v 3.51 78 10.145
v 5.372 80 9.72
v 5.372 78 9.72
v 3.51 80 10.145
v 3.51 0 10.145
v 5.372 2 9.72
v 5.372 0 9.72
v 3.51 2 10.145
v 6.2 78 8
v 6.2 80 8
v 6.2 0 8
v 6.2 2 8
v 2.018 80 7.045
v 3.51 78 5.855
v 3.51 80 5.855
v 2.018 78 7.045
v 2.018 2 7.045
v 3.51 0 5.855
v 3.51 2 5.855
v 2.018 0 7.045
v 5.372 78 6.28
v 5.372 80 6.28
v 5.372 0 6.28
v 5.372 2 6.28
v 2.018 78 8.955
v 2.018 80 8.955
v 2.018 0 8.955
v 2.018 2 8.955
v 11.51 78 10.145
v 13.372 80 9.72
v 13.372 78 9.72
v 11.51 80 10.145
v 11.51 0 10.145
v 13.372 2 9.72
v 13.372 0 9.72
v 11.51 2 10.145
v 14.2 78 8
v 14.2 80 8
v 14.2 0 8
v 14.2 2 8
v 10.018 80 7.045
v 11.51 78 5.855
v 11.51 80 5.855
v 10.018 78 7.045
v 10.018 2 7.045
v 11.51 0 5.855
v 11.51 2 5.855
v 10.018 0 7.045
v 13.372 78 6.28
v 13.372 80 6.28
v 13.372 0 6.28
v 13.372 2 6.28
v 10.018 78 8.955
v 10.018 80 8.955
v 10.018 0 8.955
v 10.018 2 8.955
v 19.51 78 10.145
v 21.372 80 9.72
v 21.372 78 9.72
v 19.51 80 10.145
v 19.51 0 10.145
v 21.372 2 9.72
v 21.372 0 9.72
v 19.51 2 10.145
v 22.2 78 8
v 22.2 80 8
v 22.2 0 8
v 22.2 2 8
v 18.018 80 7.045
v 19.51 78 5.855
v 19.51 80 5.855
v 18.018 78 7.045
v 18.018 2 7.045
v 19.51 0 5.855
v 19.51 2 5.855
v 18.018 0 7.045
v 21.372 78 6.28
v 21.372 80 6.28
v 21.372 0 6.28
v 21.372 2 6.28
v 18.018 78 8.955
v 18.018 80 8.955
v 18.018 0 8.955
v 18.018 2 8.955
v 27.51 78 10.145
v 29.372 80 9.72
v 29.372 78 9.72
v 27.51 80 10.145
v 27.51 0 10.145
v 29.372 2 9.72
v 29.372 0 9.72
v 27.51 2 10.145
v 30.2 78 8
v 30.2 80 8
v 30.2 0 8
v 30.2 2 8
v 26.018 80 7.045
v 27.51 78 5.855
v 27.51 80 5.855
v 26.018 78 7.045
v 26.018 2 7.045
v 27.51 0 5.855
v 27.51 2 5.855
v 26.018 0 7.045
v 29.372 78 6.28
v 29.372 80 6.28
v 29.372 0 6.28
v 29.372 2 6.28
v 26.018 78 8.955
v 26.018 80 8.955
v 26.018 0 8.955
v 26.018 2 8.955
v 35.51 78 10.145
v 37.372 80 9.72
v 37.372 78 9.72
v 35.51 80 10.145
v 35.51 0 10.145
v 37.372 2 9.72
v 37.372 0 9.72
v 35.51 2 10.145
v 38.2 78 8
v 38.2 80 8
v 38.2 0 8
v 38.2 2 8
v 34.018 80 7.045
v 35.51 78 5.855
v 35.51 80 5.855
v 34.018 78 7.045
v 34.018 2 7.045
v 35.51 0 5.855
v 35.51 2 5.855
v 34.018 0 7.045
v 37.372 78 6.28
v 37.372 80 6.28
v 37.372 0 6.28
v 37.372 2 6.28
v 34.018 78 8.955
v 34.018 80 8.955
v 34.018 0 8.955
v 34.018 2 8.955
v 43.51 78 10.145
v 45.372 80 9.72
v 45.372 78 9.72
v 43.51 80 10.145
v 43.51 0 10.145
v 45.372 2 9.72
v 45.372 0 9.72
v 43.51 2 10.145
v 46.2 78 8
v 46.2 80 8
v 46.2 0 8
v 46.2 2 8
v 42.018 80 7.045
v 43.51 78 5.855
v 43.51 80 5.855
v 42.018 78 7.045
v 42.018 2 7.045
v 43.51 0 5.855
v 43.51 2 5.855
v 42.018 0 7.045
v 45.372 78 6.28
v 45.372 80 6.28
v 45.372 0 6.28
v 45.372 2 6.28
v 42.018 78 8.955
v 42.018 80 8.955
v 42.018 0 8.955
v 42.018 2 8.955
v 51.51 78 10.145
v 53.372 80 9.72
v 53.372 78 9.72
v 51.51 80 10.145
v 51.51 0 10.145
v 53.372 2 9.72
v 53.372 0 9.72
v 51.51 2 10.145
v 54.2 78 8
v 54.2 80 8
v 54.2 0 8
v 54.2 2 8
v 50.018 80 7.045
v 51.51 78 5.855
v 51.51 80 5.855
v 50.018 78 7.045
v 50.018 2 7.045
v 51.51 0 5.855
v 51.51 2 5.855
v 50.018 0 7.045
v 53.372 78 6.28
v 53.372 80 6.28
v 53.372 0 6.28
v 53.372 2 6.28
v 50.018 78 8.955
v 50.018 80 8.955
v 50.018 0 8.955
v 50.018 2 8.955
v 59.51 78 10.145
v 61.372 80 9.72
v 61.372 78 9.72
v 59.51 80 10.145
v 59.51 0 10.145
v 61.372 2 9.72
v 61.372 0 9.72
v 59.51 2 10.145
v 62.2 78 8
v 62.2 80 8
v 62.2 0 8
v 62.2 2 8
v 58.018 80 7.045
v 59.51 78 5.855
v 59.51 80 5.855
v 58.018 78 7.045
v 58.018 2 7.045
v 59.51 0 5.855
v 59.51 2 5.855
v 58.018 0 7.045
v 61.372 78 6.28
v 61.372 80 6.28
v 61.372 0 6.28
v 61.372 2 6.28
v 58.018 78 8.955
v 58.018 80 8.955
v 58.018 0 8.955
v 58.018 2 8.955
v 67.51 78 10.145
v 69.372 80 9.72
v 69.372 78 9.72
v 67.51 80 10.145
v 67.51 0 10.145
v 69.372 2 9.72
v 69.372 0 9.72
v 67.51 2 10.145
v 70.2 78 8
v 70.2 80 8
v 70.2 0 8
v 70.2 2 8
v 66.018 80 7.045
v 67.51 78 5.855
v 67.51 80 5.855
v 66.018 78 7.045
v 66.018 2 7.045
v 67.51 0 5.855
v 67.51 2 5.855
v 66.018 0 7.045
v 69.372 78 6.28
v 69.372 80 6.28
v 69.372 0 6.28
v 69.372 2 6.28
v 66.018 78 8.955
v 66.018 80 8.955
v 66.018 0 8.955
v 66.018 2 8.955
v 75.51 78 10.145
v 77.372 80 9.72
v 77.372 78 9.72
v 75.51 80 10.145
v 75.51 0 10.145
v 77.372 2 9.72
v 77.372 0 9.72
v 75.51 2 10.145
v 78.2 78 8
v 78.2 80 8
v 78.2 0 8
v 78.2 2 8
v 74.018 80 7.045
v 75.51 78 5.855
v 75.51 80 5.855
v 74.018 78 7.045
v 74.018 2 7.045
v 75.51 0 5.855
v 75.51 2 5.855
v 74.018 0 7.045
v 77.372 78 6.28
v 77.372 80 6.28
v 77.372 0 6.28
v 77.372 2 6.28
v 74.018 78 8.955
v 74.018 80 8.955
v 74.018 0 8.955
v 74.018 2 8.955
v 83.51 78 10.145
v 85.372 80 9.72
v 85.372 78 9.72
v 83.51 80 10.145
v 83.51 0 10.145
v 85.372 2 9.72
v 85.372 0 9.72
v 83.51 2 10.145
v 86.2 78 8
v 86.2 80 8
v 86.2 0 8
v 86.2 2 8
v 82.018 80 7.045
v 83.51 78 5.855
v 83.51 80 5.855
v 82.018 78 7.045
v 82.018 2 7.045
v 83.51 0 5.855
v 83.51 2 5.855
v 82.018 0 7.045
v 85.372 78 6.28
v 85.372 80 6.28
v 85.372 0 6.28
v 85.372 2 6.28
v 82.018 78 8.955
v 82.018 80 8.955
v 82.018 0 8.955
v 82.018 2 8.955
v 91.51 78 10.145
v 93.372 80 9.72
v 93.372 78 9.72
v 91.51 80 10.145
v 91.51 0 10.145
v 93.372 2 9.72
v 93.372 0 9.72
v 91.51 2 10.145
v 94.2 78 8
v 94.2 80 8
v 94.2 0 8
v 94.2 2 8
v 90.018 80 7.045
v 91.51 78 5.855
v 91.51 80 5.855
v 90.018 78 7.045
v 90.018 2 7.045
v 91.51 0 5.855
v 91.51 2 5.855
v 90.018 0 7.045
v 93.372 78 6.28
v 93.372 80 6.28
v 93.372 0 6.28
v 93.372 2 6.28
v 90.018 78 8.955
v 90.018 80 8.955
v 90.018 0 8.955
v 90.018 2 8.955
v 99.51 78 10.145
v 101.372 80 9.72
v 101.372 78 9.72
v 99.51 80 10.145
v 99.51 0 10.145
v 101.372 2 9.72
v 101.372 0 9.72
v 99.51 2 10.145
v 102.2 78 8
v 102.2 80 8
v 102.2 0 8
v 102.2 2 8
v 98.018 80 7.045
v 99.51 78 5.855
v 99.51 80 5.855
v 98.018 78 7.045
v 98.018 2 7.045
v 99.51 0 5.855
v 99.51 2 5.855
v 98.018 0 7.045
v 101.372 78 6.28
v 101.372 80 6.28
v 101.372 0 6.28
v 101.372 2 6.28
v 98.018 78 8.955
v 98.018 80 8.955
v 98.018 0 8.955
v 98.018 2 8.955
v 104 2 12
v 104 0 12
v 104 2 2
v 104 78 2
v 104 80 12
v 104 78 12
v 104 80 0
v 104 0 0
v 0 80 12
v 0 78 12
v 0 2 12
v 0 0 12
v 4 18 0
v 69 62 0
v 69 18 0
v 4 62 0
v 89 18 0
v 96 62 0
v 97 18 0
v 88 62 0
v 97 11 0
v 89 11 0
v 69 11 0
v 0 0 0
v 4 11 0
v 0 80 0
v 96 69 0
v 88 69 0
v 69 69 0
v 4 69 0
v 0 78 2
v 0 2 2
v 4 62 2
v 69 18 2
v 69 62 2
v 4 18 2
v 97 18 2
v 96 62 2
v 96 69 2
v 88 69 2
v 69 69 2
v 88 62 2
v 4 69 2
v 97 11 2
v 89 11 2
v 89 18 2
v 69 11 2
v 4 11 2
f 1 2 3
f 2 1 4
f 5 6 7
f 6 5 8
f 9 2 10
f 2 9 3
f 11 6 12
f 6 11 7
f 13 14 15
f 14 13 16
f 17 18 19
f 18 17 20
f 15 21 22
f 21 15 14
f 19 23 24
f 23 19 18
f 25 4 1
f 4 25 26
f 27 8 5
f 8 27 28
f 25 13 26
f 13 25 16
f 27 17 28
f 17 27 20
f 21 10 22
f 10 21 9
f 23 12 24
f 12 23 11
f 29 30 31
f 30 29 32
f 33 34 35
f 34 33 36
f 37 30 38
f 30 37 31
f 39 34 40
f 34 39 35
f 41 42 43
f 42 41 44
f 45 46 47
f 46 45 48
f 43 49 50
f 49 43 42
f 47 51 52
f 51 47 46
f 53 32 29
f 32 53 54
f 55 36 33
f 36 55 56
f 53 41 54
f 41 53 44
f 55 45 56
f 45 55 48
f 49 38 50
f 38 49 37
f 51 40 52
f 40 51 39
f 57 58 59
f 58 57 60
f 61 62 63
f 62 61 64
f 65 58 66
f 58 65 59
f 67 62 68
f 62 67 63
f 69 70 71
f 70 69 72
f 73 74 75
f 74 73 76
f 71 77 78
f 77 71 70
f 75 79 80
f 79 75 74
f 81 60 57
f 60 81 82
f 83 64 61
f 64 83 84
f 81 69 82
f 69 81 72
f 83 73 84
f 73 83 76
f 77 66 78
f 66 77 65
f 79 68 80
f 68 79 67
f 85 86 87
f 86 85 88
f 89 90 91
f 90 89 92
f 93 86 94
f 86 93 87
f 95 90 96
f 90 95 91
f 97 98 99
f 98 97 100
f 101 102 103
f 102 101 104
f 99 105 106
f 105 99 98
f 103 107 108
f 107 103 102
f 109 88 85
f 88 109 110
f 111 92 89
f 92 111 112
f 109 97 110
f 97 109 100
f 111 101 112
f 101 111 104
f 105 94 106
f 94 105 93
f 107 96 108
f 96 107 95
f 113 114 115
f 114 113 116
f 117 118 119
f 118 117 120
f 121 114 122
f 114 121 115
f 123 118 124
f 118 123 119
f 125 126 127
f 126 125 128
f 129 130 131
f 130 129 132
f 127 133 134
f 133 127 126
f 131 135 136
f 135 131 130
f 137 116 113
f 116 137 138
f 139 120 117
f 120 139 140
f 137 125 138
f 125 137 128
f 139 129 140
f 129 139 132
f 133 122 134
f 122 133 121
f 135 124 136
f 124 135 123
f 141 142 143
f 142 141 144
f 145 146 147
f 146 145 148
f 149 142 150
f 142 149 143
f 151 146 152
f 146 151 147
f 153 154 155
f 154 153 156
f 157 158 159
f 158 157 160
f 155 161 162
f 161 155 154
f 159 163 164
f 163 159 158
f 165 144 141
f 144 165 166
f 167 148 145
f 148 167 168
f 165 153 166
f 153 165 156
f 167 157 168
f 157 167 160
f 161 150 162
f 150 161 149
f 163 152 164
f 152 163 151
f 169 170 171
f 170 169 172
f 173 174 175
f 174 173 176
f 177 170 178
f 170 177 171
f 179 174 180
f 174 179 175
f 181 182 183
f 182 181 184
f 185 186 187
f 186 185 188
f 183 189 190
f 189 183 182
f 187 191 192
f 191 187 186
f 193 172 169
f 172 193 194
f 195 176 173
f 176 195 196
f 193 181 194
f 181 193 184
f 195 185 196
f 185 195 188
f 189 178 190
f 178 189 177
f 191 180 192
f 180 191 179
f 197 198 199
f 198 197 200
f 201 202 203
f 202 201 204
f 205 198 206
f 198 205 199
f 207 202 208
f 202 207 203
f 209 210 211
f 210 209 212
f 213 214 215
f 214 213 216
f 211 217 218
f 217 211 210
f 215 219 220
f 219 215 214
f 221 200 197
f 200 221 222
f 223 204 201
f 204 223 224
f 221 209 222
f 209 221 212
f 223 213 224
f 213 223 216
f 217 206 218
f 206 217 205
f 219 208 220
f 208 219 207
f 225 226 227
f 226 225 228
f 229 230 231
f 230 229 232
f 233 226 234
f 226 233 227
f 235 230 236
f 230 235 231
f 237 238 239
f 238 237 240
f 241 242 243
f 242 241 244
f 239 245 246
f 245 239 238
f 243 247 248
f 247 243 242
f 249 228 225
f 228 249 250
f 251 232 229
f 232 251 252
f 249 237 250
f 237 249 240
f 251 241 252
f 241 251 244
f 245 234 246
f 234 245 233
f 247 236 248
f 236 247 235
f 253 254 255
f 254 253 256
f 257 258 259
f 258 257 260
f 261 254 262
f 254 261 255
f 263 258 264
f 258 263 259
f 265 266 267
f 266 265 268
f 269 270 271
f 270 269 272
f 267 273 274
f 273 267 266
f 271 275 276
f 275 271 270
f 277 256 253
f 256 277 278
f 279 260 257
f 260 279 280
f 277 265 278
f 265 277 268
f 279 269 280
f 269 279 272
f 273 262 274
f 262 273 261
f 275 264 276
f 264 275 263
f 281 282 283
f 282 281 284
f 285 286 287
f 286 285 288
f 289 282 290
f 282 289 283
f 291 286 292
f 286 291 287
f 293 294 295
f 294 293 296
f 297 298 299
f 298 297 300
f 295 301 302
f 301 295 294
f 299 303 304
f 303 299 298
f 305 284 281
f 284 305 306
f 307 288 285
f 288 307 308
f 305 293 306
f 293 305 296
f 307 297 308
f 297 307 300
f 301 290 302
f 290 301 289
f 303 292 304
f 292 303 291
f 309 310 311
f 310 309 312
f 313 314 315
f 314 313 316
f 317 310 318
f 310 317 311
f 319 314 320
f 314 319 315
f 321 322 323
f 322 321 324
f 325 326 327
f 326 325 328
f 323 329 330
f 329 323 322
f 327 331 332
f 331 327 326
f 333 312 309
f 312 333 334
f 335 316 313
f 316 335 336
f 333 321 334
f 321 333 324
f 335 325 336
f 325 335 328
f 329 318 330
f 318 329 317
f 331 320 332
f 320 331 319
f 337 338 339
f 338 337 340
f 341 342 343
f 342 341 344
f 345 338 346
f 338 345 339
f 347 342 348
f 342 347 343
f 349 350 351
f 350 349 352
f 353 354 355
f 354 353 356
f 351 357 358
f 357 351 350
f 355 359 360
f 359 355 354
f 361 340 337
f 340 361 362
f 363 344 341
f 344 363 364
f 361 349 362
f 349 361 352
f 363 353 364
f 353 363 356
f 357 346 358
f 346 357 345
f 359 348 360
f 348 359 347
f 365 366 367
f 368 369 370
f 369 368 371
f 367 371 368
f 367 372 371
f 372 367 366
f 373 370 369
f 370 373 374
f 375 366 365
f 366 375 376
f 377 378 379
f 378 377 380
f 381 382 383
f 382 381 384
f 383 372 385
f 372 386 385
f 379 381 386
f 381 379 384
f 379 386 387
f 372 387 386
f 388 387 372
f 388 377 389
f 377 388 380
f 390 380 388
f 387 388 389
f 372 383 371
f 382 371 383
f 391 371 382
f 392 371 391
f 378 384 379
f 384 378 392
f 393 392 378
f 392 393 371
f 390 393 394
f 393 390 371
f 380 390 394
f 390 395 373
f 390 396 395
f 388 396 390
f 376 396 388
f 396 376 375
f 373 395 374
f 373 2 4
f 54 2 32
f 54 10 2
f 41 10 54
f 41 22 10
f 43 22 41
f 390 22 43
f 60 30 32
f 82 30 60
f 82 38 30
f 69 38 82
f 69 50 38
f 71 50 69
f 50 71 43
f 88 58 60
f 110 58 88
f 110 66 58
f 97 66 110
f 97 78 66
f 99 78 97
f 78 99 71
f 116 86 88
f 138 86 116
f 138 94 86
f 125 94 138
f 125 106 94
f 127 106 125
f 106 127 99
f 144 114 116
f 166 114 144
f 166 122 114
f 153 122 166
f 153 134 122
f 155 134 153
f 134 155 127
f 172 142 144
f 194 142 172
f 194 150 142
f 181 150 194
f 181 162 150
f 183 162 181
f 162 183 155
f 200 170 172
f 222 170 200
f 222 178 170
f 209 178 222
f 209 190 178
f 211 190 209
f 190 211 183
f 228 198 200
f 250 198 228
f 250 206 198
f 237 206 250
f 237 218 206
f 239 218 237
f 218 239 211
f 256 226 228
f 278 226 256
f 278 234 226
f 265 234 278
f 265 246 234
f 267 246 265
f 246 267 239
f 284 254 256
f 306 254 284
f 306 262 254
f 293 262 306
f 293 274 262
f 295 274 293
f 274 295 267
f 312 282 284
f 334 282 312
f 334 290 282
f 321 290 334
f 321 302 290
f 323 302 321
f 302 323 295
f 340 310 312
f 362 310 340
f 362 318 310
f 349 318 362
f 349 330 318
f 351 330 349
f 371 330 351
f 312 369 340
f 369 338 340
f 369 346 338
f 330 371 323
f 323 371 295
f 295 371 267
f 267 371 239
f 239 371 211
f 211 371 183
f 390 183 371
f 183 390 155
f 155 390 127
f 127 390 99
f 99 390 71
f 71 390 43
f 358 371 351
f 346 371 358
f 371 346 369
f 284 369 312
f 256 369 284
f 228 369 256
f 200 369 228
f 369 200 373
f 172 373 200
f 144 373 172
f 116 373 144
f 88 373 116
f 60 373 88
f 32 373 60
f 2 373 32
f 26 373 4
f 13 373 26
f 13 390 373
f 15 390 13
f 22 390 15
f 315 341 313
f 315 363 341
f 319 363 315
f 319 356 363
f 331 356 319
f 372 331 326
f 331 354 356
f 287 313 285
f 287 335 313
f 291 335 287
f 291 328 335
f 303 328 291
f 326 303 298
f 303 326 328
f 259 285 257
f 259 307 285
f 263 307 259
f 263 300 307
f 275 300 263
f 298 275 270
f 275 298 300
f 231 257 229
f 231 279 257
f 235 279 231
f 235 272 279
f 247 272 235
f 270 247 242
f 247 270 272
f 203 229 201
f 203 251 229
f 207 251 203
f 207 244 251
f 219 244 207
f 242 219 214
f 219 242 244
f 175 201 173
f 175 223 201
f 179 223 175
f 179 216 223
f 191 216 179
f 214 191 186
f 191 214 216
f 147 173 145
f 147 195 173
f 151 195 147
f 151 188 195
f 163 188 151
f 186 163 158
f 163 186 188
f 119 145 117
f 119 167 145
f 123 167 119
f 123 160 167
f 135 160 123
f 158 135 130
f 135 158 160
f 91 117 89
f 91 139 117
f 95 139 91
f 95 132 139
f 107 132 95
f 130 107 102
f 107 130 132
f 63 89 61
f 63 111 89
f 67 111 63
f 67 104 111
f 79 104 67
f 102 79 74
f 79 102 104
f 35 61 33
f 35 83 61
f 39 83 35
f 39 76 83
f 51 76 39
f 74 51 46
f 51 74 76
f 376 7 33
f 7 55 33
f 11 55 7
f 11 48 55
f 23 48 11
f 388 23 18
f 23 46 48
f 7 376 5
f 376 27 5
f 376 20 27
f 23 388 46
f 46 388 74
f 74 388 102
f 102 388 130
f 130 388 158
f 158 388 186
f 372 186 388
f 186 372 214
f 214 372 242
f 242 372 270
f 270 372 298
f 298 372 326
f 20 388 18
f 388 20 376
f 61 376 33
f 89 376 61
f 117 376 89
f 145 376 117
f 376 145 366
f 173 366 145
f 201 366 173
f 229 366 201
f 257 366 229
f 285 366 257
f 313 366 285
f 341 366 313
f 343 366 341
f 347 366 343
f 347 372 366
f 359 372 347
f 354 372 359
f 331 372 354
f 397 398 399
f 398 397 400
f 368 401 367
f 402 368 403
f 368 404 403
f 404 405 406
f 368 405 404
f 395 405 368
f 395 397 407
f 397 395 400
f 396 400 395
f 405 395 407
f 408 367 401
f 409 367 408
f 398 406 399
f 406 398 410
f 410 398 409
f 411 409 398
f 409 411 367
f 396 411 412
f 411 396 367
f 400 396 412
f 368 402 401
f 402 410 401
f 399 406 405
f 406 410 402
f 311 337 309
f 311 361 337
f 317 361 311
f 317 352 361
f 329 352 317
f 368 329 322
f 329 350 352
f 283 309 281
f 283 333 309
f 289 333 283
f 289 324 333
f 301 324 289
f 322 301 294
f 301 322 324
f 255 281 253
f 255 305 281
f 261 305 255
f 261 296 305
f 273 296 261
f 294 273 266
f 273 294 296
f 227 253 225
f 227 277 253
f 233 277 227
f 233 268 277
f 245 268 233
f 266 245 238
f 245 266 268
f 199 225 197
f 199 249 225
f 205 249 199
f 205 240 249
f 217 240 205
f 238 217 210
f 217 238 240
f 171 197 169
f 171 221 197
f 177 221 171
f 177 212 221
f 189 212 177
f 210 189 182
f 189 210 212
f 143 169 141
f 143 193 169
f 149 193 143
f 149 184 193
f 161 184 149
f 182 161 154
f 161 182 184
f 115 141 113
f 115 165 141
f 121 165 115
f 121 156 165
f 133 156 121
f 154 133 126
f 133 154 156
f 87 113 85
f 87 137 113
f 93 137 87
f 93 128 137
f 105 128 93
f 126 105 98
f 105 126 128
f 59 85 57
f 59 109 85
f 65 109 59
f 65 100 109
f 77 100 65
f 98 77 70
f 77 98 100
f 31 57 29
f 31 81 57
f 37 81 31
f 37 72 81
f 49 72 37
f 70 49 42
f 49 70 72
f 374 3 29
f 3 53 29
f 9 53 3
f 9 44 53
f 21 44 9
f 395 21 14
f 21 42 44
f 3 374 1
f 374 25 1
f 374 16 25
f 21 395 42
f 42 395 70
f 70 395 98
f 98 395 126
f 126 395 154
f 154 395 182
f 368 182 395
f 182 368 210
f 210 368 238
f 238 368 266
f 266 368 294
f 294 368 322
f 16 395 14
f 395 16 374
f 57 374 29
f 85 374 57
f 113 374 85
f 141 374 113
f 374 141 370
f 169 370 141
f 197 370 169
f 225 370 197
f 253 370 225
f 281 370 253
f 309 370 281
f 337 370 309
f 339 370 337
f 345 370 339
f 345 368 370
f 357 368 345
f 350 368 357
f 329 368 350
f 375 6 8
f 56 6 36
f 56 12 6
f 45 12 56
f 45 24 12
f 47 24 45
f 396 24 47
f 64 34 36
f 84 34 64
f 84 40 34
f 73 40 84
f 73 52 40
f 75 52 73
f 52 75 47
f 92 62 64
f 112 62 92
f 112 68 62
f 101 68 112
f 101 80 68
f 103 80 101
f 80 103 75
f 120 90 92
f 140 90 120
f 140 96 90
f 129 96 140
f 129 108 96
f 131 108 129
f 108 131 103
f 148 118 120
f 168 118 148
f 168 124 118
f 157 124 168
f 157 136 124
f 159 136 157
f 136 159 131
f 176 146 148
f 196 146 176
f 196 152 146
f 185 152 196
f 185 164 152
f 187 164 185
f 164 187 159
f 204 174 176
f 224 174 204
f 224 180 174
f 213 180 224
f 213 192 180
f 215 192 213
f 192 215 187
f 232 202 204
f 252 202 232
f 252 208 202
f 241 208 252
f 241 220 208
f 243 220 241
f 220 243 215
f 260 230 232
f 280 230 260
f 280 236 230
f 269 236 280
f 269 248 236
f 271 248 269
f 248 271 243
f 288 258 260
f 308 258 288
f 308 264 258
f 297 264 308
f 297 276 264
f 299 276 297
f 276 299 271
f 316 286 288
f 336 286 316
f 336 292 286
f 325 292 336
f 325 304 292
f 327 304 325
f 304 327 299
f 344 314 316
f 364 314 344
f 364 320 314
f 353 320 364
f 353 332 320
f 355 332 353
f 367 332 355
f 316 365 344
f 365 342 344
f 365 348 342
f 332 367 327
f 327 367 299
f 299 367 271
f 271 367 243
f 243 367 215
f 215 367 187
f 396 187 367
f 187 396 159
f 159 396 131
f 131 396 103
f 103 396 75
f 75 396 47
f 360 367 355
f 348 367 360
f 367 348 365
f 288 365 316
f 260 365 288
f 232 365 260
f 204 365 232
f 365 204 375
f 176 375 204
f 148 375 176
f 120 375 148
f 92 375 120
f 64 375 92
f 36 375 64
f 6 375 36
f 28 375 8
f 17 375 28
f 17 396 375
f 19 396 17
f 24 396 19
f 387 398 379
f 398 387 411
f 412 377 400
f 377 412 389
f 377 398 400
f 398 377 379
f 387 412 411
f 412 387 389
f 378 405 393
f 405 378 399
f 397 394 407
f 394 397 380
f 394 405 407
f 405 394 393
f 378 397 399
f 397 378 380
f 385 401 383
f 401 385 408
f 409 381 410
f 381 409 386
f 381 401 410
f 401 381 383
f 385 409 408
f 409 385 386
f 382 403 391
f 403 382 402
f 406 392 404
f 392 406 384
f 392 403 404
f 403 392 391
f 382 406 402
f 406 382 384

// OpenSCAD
space = 4;
hole = 4;
pad = space / 2;

length = 13;
width = 10;

board_length=96;
board_width=66;
span_front = 2;
span_side = 4;
span_width = 7;
jump_size = 8;
span_size = 65;
span_back = 1;

l = length*hole + (length-1)*space + 2*pad;
w = width*hole + (width-1)*space + 2*pad;
h = pad + hole + pad + pad + pad;
offx = pad + span_front;
offy = (w - board_width) / 2 + span_side;

difference() {
    
    // total piece
    cube([l, w, h]);
    
    // hollow internal
    translate([pad, pad, pad]) {
        cube([l - 2*pad, w - 2*pad, h]);
    };
    
    // horizontal holes
    for(i=[0:length-1]) {
        translate([
            i*(hole+space) + pad + hole/2,
            w/2,
            3*pad + hole/2
        ]) {
            rotate([90, 0, 0]) {
                translate([0, 0, -w/2 -pad]) {
                    cylinder(h=w + 2*pad, r=hole/2 + 0.2);
                };
            };
        };
    };

    // spans
    translate([offx, offy, -pad]) {
        cube([span_size, span_width, 3*pad]);
    };
    translate([offx, w - offy - span_width, -pad]) {
        cube([span_size, span_width, 3*pad]);
    };
    
    // jumpers
    translate([pad + board_length - span_back - jump_size, offy, -pad]) {
        cube([jump_size, span_width, 3*pad]);
    };
    translate([pad + board_length - span_front - jump_size, w - offy - span_width, -pad]) {
        cube([jump_size, span_width, 3*pad]);
    };
    
    // open back
    translate([-pad, pad, pad]) {
        cube([3 * pad, w - 2*pad, h]);
    }

    // open front
    translate([l - 2*pad, pad, pad]) {
        cube([3 * pad, w - 2*pad, h]);
    }
};
